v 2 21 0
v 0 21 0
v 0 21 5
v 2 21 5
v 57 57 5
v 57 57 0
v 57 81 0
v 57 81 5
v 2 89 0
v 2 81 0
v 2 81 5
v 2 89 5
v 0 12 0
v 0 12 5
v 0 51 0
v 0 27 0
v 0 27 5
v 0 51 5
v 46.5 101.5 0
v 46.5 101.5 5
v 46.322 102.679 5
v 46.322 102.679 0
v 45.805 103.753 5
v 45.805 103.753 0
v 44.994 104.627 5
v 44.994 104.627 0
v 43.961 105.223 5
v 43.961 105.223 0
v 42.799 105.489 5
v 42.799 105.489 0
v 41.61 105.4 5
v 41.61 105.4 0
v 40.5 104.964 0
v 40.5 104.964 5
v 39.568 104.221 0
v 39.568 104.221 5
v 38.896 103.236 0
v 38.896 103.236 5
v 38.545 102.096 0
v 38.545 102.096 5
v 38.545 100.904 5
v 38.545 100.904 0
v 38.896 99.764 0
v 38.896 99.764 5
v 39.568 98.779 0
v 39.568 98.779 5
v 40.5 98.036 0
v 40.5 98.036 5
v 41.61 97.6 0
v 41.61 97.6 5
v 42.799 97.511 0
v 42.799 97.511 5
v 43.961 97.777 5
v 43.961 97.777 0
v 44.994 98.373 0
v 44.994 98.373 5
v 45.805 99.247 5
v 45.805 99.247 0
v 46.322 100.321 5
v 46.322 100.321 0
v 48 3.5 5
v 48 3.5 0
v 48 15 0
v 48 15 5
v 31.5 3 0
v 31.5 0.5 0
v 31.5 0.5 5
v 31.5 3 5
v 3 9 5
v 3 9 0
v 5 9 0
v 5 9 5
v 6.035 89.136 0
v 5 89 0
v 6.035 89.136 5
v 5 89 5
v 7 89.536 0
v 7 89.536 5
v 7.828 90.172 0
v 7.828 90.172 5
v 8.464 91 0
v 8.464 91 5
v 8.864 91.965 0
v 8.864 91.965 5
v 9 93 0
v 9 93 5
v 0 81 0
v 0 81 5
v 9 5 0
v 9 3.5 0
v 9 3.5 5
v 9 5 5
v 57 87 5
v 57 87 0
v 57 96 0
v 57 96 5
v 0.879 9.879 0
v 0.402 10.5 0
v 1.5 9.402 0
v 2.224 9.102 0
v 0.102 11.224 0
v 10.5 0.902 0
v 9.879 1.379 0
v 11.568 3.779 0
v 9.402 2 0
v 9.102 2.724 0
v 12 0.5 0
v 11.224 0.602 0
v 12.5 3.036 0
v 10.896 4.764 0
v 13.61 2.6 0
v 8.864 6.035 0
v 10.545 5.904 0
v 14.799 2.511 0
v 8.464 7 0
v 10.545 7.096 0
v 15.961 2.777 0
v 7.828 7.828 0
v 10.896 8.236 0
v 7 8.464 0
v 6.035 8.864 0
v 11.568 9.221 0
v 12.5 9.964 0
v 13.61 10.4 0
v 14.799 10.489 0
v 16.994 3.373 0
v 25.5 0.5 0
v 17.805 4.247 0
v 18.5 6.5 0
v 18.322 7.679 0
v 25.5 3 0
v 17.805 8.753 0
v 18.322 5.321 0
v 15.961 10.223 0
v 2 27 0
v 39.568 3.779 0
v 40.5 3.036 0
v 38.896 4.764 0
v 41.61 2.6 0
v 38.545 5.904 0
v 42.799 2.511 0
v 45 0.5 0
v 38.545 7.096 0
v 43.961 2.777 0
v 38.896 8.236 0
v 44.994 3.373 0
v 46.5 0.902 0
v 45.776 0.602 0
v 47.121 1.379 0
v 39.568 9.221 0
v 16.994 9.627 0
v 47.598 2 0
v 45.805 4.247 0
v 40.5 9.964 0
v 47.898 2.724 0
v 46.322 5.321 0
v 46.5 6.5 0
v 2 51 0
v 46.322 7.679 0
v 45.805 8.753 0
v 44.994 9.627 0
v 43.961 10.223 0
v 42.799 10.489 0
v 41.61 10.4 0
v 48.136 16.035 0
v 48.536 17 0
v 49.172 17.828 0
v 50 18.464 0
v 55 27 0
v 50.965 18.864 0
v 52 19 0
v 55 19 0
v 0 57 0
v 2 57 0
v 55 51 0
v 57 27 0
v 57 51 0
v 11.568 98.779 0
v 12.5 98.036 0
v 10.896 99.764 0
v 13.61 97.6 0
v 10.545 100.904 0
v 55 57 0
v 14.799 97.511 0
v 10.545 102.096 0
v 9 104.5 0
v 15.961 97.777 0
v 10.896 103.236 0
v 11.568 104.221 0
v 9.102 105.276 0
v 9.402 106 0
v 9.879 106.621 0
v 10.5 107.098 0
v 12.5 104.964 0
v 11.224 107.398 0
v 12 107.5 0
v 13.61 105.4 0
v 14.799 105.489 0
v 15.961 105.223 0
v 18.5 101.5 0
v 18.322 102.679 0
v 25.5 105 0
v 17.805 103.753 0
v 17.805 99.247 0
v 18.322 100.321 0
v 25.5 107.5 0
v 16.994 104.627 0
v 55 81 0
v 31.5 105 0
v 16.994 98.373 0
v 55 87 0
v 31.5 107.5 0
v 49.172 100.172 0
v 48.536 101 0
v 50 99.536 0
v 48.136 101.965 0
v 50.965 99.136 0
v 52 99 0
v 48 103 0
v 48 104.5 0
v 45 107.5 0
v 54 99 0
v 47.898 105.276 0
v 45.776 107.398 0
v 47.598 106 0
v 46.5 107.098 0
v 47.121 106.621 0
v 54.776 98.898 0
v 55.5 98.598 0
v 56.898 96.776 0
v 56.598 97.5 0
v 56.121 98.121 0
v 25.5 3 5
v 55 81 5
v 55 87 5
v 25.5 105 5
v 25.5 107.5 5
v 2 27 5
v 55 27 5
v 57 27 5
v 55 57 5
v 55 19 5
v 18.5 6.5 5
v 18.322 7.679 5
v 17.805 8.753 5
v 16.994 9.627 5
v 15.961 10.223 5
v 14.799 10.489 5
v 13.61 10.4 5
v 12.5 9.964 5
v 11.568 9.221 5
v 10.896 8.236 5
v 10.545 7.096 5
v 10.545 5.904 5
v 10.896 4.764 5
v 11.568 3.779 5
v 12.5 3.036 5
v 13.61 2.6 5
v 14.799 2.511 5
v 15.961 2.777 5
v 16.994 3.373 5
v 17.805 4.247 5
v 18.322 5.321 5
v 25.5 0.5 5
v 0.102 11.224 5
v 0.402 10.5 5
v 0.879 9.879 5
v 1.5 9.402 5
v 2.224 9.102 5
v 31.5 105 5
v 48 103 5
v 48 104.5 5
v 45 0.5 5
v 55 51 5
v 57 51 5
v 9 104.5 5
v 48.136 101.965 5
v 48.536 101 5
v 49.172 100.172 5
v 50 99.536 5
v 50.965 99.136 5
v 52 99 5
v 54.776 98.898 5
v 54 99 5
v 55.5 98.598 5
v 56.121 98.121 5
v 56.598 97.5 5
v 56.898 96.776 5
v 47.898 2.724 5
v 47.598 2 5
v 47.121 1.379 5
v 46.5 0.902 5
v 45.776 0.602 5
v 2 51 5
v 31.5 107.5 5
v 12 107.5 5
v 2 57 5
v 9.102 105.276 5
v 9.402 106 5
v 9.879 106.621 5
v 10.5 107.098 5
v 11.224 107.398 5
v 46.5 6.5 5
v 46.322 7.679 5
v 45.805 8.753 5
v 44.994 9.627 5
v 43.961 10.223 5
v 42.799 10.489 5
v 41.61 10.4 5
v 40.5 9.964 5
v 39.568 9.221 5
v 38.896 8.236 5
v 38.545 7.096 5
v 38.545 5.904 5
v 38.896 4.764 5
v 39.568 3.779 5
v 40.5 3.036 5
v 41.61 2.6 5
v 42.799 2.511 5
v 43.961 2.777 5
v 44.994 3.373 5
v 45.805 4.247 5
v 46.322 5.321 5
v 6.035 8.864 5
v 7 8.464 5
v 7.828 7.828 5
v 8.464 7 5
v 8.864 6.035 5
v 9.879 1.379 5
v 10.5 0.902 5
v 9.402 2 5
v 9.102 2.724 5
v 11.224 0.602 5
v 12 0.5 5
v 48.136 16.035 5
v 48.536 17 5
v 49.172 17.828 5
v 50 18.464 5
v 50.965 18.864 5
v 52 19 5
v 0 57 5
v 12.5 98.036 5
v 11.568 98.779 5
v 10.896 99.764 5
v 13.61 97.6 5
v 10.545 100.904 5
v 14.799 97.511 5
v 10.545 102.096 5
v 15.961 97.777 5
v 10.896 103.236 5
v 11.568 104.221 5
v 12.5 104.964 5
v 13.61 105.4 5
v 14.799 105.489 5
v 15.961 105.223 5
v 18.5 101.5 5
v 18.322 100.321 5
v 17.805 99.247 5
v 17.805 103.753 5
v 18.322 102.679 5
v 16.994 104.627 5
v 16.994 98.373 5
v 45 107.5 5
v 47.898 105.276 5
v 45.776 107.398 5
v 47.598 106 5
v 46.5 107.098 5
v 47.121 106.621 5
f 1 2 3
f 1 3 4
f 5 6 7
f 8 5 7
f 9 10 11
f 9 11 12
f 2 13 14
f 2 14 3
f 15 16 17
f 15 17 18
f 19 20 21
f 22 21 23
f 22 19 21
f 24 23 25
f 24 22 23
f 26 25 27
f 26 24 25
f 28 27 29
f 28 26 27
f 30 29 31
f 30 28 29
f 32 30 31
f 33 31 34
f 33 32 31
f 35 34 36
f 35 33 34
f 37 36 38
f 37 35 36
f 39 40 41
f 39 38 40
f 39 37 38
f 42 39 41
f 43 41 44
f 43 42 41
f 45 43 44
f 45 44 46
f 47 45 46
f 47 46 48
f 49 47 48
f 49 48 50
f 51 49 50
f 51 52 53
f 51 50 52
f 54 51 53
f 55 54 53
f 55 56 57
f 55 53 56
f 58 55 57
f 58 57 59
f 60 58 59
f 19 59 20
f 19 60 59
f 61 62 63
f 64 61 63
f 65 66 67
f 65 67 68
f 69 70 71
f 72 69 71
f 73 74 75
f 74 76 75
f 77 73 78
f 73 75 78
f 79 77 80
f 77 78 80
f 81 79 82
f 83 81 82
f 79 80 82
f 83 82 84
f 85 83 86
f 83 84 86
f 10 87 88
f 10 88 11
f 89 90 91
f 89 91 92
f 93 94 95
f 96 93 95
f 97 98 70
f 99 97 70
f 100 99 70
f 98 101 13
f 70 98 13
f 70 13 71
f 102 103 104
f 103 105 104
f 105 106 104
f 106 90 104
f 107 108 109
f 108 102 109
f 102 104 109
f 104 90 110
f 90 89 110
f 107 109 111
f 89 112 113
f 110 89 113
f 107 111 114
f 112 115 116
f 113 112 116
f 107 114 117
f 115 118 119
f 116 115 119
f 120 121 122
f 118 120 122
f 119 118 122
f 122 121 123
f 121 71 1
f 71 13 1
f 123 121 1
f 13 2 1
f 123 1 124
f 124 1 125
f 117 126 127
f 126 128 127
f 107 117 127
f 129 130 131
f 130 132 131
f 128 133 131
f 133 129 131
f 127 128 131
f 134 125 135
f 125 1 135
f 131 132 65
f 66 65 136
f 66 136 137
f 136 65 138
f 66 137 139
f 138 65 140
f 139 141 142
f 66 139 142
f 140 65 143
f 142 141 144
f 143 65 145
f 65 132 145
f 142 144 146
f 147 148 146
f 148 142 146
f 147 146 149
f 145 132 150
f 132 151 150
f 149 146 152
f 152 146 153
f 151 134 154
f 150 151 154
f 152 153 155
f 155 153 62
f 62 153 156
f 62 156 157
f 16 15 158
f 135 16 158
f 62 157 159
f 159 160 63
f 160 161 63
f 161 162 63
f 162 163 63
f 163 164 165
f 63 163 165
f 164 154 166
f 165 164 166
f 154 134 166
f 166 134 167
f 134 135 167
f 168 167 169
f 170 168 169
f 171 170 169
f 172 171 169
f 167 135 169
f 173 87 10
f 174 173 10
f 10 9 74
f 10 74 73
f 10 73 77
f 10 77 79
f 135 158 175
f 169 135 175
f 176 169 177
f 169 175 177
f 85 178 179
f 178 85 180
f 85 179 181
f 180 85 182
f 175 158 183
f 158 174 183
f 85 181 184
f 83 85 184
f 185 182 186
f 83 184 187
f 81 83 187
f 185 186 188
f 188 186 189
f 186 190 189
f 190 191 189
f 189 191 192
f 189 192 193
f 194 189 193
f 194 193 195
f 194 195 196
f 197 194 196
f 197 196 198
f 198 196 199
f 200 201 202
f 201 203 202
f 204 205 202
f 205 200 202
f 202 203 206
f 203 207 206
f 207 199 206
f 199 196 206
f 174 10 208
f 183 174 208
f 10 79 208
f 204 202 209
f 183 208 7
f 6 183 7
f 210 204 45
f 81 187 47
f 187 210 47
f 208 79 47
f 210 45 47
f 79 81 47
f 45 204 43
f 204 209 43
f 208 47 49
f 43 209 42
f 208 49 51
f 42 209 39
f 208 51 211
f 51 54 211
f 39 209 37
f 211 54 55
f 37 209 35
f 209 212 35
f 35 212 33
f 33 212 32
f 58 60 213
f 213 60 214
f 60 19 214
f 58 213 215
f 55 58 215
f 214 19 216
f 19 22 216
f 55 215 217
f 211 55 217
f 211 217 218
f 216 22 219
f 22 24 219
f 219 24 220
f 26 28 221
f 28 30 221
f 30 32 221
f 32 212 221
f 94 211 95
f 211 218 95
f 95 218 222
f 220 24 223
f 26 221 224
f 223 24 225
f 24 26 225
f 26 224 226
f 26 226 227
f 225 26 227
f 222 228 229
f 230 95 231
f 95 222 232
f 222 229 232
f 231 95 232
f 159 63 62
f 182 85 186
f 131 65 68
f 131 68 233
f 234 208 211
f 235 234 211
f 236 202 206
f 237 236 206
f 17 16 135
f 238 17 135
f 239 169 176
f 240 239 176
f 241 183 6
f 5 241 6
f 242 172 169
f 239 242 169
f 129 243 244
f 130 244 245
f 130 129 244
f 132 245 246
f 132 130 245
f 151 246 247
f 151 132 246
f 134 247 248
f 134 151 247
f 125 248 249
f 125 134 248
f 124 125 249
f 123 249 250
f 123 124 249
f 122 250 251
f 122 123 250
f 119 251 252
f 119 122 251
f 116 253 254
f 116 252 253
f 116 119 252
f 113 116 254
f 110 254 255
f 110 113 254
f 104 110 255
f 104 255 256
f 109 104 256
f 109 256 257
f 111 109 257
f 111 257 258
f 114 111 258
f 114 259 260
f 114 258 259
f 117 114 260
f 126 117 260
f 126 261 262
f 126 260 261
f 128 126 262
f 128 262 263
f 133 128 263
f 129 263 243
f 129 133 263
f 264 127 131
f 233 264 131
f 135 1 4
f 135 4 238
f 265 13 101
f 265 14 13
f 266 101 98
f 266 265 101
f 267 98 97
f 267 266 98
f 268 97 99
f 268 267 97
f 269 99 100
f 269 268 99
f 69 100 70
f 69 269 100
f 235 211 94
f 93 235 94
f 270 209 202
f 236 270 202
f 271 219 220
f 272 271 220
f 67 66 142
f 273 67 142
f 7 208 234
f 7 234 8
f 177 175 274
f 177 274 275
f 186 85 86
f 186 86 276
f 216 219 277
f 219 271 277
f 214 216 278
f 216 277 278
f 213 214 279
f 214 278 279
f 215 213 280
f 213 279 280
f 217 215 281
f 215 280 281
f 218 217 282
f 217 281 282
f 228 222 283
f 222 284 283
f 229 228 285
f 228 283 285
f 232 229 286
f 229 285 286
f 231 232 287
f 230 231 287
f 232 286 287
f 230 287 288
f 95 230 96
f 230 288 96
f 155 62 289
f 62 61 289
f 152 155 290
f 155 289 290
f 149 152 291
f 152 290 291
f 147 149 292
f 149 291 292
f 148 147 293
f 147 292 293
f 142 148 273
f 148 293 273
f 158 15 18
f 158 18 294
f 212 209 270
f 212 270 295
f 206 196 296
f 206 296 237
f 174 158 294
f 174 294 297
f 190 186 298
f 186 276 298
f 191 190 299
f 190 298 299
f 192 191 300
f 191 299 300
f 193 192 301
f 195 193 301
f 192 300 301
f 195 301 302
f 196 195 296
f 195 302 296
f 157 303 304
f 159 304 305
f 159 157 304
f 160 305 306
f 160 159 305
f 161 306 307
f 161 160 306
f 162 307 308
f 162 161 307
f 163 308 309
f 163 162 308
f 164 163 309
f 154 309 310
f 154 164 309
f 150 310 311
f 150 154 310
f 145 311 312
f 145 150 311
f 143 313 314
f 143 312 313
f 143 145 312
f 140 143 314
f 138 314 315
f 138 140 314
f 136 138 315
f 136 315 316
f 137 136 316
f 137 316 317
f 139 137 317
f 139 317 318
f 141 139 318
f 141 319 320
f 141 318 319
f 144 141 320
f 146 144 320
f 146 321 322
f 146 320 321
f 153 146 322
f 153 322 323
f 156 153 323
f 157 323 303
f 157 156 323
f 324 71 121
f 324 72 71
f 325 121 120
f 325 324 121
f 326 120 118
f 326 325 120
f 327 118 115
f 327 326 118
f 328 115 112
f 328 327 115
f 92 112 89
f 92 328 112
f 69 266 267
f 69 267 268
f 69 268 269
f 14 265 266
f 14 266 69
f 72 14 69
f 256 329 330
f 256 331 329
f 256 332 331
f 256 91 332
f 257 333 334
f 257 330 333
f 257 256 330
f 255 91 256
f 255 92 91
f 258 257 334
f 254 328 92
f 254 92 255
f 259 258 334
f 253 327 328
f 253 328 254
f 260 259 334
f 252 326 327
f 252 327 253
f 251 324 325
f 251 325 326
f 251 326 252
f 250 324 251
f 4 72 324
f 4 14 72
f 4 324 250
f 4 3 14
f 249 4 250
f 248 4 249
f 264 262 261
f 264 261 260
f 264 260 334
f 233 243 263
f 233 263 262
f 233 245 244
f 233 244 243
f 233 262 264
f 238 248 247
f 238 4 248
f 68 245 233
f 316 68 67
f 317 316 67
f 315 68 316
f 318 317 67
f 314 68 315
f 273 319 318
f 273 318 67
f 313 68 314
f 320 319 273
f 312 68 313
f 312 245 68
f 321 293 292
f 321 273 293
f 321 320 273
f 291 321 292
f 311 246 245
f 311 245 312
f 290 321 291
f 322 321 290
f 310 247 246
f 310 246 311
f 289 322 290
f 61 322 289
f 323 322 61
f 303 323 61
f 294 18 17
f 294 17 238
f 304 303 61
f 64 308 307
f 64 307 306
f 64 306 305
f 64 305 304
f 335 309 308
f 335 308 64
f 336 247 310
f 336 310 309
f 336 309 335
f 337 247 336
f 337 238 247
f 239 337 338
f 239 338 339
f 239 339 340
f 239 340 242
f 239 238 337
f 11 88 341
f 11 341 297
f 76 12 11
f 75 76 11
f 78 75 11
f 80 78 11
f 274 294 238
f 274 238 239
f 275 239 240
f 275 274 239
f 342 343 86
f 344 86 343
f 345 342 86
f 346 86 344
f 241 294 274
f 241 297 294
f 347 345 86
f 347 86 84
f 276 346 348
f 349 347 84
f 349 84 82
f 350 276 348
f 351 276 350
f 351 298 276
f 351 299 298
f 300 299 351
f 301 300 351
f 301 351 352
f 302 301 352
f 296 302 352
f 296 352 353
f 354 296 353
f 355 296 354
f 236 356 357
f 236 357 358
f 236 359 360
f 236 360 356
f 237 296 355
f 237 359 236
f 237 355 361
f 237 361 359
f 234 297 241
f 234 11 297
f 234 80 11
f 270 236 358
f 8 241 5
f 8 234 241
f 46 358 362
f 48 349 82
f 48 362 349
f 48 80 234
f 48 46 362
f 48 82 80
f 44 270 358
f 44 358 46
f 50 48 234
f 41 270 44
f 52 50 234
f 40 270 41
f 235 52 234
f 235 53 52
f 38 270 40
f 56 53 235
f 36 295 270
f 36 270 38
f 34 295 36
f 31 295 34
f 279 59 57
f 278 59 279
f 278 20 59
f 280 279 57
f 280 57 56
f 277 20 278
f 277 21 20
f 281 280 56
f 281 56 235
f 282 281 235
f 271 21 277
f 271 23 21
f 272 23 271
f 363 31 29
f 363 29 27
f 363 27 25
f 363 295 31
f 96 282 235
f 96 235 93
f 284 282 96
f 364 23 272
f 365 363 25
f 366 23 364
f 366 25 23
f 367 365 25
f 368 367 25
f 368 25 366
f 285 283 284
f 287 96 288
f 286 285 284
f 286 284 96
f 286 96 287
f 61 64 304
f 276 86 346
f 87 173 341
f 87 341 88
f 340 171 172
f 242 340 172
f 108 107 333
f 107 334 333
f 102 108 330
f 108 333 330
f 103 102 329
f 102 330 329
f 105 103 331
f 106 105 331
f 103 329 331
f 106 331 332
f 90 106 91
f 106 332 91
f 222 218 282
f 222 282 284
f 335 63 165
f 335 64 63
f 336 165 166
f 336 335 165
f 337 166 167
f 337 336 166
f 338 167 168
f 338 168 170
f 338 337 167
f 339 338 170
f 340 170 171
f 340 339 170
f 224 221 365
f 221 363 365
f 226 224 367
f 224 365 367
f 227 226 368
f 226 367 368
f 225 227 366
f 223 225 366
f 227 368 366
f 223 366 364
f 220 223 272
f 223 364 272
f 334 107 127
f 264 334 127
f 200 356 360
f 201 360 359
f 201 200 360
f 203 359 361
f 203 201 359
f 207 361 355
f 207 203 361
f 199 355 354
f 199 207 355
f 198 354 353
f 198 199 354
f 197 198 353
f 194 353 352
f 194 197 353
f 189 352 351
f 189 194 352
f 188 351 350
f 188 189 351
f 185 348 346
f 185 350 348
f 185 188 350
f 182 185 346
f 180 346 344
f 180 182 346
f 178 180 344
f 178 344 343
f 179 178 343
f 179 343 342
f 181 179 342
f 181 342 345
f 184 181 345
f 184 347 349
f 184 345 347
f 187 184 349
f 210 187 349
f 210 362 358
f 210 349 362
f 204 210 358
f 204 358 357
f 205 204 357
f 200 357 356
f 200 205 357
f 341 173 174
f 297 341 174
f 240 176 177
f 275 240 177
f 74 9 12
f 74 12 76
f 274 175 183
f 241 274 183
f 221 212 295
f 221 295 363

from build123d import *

# Parameters (mm, degrees)
BOX002_W               = 9
BOX002_H               = 9
BOX002_DEPTH           = 10
BOX003_W               = 9
BOX003_H               = 19
BOX003_DEPTH           = 10
BOX004_W               = 9
BOX004_H               = 9
BOX004_DEPTH           = 10
BOX005_W               = 2
BOX005_H               = 6
BOX005_DEPTH           = 10
BOX006_W               = 2
BOX006_H               = 8
BOX006_DEPTH           = 10
BOX007_W               = 2
BOX007_H               = 6
BOX007_DEPTH           = 10
BOX008_W               = 2
BOX008_H               = 6
BOX008_DEPTH           = 10
BOX009_W               = 2
BOX009_H               = 6
BOX009_DEPTH           = 10
BOX010_W               = 2
BOX010_H               = 8
BOX010_DEPTH           = 10
CYLINDER_R             = 4
CYLINDER_DEPTH         = 10
CYLINDER002_R          = 4
CYLINDER002_DEPTH      = 10
CYLINDER001_R          = 4
CYLINDER001_DEPTH      = 10
CYLINDER003_R          = 4
CYLINDER003_DEPTH      = 10
BOX011_W               = 3
BOX011_H               = 6
BOX011_DEPTH           = 10
BOX011_PLACEMENT_ANGLE = 90
BOX012_W               = 3
BOX012_H               = 6
BOX012_DEPTH           = 10
BOX012_PLACEMENT_ANGLE = 90
BOX001_W               = 9
BOX001_H               = 19
BOX001_DEPTH           = 10
BOX_W                  = 57
BOX_H                  = 107
BOX_DEPTH              = 5
FILLET_R               = 3
FILLET001_R            = 4


with BuildPart() as cube002:
    # Box002 → Box002 (new body)
    with BuildSketch(Plane.XY):
        with Locations((4.5, 4.5)):
            Rectangle(BOX002_W, BOX002_H)
    extrude(amount=BOX002_DEPTH)


with BuildPart() as cube003:
    # Box003 → Box003 (new body)
    with BuildSketch(Plane(origin=(0, 89, 0), x_dir=(1, 0, 0), z_dir=(0, 0, 1))):
        with Locations((4.5, 9.5)):
            Rectangle(BOX003_W, BOX003_H)
    extrude(amount=BOX003_DEPTH)


with BuildPart() as cube004:
    # Box004 → Box004 (new body)
    with BuildSketch(Plane(origin=(48, 99, 0), x_dir=(1, 0, 0), z_dir=(0, 0, 1))):
        with Locations((4.5, 4.5)):
            Rectangle(BOX004_W, BOX004_H)
    extrude(amount=BOX004_DEPTH)


with BuildPart() as cube005:
    # Box005 → Box005 (new body)
    with BuildSketch(Plane(origin=(0, 51, 0), x_dir=(1, 0, 0), z_dir=(0, 0, 1))):
        with Locations((1, 3)):
            Rectangle(BOX005_W, BOX005_H)
    extrude(amount=BOX005_DEPTH)


with BuildPart() as cube006:
    # Box006 → Box006 (new body)
    with BuildSketch(Plane(origin=(0, 81, 0), x_dir=(1, 0, 0), z_dir=(0, 0, 1))):
        with Locations((1, 4)):
            Rectangle(BOX006_W, BOX006_H)
    extrude(amount=BOX006_DEPTH)


with BuildPart() as cube007:
    # Box007 → Box007 (new body)
    with BuildSketch(Plane(origin=(0, 21, 0), x_dir=(1, 0, 0), z_dir=(0, 0, 1))):
        with Locations((1, 3)):
            Rectangle(BOX007_W, BOX007_H)
    extrude(amount=BOX007_DEPTH)


with BuildPart() as cube008:
    # Box008 → Box008 (new body)
    with BuildSketch(Plane(origin=(55, 51, 0), x_dir=(1, 0, 0), z_dir=(0, 0, 1))):
        with Locations((1, 3)):
            Rectangle(BOX008_W, BOX008_H)
    extrude(amount=BOX008_DEPTH)


with BuildPart() as cube009:
    # Box009 → Box009 (new body)
    with BuildSketch(Plane(origin=(55, 81, 0), x_dir=(1, 0, 0), z_dir=(0, 0, 1))):
        with Locations((1, 3)):
            Rectangle(BOX009_W, BOX009_H)
    extrude(amount=BOX009_DEPTH)


with BuildPart() as cube010:
    # Box010 → Box010 (new body)
    with BuildSketch(Plane(origin=(55, 19, 0), x_dir=(1, 0, 0), z_dir=(0, 0, 1))):
        with Locations((1, 4)):
            Rectangle(BOX010_W, BOX010_H)
    extrude(amount=BOX010_DEPTH)


with BuildPart() as cylinder:
    # Cylinder → Cylinder (new body)
    with BuildSketch(Plane(origin=(14.5, 6.5, 0), x_dir=(1, 0, 0), z_dir=(0, 0, 1))):
        Circle(CYLINDER_R)
    extrude(amount=CYLINDER_DEPTH)


with BuildPart() as cylinder002:
    # Cylinder002 → Cylinder002 (new body)
    with BuildSketch(Plane(origin=(42.5, 101.5, 0), x_dir=(1, 0, 0), z_dir=(0, 0, 1))):
        Circle(CYLINDER002_R)
    extrude(amount=CYLINDER002_DEPTH)


with BuildPart() as cylinder001:
    # Cylinder001 → Cylinder001 (new body)
    with BuildSketch(Plane(origin=(42.5, 6.5, 0), x_dir=(1, 0, 0), z_dir=(0, 0, 1))):
        Circle(CYLINDER001_R)
    extrude(amount=CYLINDER001_DEPTH)


with BuildPart() as cylinder003:
    # Cylinder003 → Cylinder003 (new body)
    with BuildSketch(Plane(origin=(14.5, 101.5, 0), x_dir=(1, 0, 0), z_dir=(0, 0, 1))):
        Circle(CYLINDER003_R)
    extrude(amount=CYLINDER003_DEPTH)


with BuildPart() as cube011:
    # Box011 → Box011 (new body)
    with BuildSketch(Plane.XY):
        with Locations((1.5, 3)):
            Rectangle(BOX011_W, BOX011_H)
    extrude(amount=BOX011_DEPTH)


with BuildPart() as cube011_1:
    # Box011 placement: moved
    add(cube011.part.moved(Location((31.5, 0, 0))).rotate(Axis((31.5, 0, 0), (0, 0, 1)), BOX011_PLACEMENT_ANGLE))


with BuildPart() as cube012:
    # Box012 → Box012 (new body)
    with BuildSketch(Plane.XY):
        with Locations((1.5, 3)):
            Rectangle(BOX012_W, BOX012_H)
    extrude(amount=BOX012_DEPTH)


with BuildPart() as cube012_1:
    # Box012 placement: moved
    add(cube012.part.moved(Location((31.5, 105, 0))).rotate(Axis((31.5, 105, 0), (0, 0, 1)), BOX012_PLACEMENT_ANGLE))


with BuildPart() as fusion:
    # Box001 → Box001 (new body)
    with BuildSketch(Plane(origin=(48, 0, 0), x_dir=(1, 0, 0), z_dir=(0, 0, 1))):
        with Locations((4.5, 9.5)):
            Rectangle(BOX001_W, BOX001_H)
    extrude(amount=BOX001_DEPTH)

    # Fusion: union Cube002, Cube003, Cube004, Cube005, Cube006, Cube007, Cube008, Cube009, Cube010, Cylinder, Cylinder002, Cylinder001, Cylinder003, Cube011, Cube012
    add(cube002.part)
    add(cube003.part)
    add(cube004.part)
    add(cube005.part)
    add(cube006.part)
    add(cube007.part)
    add(cube008.part)
    add(cube009.part)
    add(cube010.part)
    add(cylinder.part)
    add(cylinder002.part)
    add(cylinder001.part)
    add(cylinder003.part)
    add(cube011_1.part)
    add(cube012_1.part)


with BuildPart() as fillet001:
    # Box → Box (new body)
    with BuildSketch(Plane(origin=(0, 0.5, 0), x_dir=(1, 0, 0), z_dir=(0, 0, 1))):
        with Locations((28.5, 53.5)):
            Rectangle(BOX_W, BOX_H)
    extrude(amount=BOX_DEPTH)

    # Cut: cut Fusion
    add(fusion.part, mode=Mode.SUBTRACT)

    # Fillet
    fillet_edges = [fillet001.edges().sort_by_distance(p)[0] for p in [
        (9, 107.5, 2.5),
        (48, 107.5, 2.5),
        (57, 99, 2.5),
        (48, 0.5, 2.5),
        (9, 0.5, 2.5),
        (0, 9, 2.5),
    ]]
    fillet(fillet_edges, radius=FILLET_R)

    # Fillet001
    fillet001_edges = [fillet001.edges().sort_by_distance(p)[0] for p in [
        (9, 89, 2.5),
        (48, 99, 2.5),
        (9, 9, 2.5),
        (48, 19, 2.5),
    ]]
    fillet(fillet001_edges, radius=FILLET001_R)


solid = fillet001.part
